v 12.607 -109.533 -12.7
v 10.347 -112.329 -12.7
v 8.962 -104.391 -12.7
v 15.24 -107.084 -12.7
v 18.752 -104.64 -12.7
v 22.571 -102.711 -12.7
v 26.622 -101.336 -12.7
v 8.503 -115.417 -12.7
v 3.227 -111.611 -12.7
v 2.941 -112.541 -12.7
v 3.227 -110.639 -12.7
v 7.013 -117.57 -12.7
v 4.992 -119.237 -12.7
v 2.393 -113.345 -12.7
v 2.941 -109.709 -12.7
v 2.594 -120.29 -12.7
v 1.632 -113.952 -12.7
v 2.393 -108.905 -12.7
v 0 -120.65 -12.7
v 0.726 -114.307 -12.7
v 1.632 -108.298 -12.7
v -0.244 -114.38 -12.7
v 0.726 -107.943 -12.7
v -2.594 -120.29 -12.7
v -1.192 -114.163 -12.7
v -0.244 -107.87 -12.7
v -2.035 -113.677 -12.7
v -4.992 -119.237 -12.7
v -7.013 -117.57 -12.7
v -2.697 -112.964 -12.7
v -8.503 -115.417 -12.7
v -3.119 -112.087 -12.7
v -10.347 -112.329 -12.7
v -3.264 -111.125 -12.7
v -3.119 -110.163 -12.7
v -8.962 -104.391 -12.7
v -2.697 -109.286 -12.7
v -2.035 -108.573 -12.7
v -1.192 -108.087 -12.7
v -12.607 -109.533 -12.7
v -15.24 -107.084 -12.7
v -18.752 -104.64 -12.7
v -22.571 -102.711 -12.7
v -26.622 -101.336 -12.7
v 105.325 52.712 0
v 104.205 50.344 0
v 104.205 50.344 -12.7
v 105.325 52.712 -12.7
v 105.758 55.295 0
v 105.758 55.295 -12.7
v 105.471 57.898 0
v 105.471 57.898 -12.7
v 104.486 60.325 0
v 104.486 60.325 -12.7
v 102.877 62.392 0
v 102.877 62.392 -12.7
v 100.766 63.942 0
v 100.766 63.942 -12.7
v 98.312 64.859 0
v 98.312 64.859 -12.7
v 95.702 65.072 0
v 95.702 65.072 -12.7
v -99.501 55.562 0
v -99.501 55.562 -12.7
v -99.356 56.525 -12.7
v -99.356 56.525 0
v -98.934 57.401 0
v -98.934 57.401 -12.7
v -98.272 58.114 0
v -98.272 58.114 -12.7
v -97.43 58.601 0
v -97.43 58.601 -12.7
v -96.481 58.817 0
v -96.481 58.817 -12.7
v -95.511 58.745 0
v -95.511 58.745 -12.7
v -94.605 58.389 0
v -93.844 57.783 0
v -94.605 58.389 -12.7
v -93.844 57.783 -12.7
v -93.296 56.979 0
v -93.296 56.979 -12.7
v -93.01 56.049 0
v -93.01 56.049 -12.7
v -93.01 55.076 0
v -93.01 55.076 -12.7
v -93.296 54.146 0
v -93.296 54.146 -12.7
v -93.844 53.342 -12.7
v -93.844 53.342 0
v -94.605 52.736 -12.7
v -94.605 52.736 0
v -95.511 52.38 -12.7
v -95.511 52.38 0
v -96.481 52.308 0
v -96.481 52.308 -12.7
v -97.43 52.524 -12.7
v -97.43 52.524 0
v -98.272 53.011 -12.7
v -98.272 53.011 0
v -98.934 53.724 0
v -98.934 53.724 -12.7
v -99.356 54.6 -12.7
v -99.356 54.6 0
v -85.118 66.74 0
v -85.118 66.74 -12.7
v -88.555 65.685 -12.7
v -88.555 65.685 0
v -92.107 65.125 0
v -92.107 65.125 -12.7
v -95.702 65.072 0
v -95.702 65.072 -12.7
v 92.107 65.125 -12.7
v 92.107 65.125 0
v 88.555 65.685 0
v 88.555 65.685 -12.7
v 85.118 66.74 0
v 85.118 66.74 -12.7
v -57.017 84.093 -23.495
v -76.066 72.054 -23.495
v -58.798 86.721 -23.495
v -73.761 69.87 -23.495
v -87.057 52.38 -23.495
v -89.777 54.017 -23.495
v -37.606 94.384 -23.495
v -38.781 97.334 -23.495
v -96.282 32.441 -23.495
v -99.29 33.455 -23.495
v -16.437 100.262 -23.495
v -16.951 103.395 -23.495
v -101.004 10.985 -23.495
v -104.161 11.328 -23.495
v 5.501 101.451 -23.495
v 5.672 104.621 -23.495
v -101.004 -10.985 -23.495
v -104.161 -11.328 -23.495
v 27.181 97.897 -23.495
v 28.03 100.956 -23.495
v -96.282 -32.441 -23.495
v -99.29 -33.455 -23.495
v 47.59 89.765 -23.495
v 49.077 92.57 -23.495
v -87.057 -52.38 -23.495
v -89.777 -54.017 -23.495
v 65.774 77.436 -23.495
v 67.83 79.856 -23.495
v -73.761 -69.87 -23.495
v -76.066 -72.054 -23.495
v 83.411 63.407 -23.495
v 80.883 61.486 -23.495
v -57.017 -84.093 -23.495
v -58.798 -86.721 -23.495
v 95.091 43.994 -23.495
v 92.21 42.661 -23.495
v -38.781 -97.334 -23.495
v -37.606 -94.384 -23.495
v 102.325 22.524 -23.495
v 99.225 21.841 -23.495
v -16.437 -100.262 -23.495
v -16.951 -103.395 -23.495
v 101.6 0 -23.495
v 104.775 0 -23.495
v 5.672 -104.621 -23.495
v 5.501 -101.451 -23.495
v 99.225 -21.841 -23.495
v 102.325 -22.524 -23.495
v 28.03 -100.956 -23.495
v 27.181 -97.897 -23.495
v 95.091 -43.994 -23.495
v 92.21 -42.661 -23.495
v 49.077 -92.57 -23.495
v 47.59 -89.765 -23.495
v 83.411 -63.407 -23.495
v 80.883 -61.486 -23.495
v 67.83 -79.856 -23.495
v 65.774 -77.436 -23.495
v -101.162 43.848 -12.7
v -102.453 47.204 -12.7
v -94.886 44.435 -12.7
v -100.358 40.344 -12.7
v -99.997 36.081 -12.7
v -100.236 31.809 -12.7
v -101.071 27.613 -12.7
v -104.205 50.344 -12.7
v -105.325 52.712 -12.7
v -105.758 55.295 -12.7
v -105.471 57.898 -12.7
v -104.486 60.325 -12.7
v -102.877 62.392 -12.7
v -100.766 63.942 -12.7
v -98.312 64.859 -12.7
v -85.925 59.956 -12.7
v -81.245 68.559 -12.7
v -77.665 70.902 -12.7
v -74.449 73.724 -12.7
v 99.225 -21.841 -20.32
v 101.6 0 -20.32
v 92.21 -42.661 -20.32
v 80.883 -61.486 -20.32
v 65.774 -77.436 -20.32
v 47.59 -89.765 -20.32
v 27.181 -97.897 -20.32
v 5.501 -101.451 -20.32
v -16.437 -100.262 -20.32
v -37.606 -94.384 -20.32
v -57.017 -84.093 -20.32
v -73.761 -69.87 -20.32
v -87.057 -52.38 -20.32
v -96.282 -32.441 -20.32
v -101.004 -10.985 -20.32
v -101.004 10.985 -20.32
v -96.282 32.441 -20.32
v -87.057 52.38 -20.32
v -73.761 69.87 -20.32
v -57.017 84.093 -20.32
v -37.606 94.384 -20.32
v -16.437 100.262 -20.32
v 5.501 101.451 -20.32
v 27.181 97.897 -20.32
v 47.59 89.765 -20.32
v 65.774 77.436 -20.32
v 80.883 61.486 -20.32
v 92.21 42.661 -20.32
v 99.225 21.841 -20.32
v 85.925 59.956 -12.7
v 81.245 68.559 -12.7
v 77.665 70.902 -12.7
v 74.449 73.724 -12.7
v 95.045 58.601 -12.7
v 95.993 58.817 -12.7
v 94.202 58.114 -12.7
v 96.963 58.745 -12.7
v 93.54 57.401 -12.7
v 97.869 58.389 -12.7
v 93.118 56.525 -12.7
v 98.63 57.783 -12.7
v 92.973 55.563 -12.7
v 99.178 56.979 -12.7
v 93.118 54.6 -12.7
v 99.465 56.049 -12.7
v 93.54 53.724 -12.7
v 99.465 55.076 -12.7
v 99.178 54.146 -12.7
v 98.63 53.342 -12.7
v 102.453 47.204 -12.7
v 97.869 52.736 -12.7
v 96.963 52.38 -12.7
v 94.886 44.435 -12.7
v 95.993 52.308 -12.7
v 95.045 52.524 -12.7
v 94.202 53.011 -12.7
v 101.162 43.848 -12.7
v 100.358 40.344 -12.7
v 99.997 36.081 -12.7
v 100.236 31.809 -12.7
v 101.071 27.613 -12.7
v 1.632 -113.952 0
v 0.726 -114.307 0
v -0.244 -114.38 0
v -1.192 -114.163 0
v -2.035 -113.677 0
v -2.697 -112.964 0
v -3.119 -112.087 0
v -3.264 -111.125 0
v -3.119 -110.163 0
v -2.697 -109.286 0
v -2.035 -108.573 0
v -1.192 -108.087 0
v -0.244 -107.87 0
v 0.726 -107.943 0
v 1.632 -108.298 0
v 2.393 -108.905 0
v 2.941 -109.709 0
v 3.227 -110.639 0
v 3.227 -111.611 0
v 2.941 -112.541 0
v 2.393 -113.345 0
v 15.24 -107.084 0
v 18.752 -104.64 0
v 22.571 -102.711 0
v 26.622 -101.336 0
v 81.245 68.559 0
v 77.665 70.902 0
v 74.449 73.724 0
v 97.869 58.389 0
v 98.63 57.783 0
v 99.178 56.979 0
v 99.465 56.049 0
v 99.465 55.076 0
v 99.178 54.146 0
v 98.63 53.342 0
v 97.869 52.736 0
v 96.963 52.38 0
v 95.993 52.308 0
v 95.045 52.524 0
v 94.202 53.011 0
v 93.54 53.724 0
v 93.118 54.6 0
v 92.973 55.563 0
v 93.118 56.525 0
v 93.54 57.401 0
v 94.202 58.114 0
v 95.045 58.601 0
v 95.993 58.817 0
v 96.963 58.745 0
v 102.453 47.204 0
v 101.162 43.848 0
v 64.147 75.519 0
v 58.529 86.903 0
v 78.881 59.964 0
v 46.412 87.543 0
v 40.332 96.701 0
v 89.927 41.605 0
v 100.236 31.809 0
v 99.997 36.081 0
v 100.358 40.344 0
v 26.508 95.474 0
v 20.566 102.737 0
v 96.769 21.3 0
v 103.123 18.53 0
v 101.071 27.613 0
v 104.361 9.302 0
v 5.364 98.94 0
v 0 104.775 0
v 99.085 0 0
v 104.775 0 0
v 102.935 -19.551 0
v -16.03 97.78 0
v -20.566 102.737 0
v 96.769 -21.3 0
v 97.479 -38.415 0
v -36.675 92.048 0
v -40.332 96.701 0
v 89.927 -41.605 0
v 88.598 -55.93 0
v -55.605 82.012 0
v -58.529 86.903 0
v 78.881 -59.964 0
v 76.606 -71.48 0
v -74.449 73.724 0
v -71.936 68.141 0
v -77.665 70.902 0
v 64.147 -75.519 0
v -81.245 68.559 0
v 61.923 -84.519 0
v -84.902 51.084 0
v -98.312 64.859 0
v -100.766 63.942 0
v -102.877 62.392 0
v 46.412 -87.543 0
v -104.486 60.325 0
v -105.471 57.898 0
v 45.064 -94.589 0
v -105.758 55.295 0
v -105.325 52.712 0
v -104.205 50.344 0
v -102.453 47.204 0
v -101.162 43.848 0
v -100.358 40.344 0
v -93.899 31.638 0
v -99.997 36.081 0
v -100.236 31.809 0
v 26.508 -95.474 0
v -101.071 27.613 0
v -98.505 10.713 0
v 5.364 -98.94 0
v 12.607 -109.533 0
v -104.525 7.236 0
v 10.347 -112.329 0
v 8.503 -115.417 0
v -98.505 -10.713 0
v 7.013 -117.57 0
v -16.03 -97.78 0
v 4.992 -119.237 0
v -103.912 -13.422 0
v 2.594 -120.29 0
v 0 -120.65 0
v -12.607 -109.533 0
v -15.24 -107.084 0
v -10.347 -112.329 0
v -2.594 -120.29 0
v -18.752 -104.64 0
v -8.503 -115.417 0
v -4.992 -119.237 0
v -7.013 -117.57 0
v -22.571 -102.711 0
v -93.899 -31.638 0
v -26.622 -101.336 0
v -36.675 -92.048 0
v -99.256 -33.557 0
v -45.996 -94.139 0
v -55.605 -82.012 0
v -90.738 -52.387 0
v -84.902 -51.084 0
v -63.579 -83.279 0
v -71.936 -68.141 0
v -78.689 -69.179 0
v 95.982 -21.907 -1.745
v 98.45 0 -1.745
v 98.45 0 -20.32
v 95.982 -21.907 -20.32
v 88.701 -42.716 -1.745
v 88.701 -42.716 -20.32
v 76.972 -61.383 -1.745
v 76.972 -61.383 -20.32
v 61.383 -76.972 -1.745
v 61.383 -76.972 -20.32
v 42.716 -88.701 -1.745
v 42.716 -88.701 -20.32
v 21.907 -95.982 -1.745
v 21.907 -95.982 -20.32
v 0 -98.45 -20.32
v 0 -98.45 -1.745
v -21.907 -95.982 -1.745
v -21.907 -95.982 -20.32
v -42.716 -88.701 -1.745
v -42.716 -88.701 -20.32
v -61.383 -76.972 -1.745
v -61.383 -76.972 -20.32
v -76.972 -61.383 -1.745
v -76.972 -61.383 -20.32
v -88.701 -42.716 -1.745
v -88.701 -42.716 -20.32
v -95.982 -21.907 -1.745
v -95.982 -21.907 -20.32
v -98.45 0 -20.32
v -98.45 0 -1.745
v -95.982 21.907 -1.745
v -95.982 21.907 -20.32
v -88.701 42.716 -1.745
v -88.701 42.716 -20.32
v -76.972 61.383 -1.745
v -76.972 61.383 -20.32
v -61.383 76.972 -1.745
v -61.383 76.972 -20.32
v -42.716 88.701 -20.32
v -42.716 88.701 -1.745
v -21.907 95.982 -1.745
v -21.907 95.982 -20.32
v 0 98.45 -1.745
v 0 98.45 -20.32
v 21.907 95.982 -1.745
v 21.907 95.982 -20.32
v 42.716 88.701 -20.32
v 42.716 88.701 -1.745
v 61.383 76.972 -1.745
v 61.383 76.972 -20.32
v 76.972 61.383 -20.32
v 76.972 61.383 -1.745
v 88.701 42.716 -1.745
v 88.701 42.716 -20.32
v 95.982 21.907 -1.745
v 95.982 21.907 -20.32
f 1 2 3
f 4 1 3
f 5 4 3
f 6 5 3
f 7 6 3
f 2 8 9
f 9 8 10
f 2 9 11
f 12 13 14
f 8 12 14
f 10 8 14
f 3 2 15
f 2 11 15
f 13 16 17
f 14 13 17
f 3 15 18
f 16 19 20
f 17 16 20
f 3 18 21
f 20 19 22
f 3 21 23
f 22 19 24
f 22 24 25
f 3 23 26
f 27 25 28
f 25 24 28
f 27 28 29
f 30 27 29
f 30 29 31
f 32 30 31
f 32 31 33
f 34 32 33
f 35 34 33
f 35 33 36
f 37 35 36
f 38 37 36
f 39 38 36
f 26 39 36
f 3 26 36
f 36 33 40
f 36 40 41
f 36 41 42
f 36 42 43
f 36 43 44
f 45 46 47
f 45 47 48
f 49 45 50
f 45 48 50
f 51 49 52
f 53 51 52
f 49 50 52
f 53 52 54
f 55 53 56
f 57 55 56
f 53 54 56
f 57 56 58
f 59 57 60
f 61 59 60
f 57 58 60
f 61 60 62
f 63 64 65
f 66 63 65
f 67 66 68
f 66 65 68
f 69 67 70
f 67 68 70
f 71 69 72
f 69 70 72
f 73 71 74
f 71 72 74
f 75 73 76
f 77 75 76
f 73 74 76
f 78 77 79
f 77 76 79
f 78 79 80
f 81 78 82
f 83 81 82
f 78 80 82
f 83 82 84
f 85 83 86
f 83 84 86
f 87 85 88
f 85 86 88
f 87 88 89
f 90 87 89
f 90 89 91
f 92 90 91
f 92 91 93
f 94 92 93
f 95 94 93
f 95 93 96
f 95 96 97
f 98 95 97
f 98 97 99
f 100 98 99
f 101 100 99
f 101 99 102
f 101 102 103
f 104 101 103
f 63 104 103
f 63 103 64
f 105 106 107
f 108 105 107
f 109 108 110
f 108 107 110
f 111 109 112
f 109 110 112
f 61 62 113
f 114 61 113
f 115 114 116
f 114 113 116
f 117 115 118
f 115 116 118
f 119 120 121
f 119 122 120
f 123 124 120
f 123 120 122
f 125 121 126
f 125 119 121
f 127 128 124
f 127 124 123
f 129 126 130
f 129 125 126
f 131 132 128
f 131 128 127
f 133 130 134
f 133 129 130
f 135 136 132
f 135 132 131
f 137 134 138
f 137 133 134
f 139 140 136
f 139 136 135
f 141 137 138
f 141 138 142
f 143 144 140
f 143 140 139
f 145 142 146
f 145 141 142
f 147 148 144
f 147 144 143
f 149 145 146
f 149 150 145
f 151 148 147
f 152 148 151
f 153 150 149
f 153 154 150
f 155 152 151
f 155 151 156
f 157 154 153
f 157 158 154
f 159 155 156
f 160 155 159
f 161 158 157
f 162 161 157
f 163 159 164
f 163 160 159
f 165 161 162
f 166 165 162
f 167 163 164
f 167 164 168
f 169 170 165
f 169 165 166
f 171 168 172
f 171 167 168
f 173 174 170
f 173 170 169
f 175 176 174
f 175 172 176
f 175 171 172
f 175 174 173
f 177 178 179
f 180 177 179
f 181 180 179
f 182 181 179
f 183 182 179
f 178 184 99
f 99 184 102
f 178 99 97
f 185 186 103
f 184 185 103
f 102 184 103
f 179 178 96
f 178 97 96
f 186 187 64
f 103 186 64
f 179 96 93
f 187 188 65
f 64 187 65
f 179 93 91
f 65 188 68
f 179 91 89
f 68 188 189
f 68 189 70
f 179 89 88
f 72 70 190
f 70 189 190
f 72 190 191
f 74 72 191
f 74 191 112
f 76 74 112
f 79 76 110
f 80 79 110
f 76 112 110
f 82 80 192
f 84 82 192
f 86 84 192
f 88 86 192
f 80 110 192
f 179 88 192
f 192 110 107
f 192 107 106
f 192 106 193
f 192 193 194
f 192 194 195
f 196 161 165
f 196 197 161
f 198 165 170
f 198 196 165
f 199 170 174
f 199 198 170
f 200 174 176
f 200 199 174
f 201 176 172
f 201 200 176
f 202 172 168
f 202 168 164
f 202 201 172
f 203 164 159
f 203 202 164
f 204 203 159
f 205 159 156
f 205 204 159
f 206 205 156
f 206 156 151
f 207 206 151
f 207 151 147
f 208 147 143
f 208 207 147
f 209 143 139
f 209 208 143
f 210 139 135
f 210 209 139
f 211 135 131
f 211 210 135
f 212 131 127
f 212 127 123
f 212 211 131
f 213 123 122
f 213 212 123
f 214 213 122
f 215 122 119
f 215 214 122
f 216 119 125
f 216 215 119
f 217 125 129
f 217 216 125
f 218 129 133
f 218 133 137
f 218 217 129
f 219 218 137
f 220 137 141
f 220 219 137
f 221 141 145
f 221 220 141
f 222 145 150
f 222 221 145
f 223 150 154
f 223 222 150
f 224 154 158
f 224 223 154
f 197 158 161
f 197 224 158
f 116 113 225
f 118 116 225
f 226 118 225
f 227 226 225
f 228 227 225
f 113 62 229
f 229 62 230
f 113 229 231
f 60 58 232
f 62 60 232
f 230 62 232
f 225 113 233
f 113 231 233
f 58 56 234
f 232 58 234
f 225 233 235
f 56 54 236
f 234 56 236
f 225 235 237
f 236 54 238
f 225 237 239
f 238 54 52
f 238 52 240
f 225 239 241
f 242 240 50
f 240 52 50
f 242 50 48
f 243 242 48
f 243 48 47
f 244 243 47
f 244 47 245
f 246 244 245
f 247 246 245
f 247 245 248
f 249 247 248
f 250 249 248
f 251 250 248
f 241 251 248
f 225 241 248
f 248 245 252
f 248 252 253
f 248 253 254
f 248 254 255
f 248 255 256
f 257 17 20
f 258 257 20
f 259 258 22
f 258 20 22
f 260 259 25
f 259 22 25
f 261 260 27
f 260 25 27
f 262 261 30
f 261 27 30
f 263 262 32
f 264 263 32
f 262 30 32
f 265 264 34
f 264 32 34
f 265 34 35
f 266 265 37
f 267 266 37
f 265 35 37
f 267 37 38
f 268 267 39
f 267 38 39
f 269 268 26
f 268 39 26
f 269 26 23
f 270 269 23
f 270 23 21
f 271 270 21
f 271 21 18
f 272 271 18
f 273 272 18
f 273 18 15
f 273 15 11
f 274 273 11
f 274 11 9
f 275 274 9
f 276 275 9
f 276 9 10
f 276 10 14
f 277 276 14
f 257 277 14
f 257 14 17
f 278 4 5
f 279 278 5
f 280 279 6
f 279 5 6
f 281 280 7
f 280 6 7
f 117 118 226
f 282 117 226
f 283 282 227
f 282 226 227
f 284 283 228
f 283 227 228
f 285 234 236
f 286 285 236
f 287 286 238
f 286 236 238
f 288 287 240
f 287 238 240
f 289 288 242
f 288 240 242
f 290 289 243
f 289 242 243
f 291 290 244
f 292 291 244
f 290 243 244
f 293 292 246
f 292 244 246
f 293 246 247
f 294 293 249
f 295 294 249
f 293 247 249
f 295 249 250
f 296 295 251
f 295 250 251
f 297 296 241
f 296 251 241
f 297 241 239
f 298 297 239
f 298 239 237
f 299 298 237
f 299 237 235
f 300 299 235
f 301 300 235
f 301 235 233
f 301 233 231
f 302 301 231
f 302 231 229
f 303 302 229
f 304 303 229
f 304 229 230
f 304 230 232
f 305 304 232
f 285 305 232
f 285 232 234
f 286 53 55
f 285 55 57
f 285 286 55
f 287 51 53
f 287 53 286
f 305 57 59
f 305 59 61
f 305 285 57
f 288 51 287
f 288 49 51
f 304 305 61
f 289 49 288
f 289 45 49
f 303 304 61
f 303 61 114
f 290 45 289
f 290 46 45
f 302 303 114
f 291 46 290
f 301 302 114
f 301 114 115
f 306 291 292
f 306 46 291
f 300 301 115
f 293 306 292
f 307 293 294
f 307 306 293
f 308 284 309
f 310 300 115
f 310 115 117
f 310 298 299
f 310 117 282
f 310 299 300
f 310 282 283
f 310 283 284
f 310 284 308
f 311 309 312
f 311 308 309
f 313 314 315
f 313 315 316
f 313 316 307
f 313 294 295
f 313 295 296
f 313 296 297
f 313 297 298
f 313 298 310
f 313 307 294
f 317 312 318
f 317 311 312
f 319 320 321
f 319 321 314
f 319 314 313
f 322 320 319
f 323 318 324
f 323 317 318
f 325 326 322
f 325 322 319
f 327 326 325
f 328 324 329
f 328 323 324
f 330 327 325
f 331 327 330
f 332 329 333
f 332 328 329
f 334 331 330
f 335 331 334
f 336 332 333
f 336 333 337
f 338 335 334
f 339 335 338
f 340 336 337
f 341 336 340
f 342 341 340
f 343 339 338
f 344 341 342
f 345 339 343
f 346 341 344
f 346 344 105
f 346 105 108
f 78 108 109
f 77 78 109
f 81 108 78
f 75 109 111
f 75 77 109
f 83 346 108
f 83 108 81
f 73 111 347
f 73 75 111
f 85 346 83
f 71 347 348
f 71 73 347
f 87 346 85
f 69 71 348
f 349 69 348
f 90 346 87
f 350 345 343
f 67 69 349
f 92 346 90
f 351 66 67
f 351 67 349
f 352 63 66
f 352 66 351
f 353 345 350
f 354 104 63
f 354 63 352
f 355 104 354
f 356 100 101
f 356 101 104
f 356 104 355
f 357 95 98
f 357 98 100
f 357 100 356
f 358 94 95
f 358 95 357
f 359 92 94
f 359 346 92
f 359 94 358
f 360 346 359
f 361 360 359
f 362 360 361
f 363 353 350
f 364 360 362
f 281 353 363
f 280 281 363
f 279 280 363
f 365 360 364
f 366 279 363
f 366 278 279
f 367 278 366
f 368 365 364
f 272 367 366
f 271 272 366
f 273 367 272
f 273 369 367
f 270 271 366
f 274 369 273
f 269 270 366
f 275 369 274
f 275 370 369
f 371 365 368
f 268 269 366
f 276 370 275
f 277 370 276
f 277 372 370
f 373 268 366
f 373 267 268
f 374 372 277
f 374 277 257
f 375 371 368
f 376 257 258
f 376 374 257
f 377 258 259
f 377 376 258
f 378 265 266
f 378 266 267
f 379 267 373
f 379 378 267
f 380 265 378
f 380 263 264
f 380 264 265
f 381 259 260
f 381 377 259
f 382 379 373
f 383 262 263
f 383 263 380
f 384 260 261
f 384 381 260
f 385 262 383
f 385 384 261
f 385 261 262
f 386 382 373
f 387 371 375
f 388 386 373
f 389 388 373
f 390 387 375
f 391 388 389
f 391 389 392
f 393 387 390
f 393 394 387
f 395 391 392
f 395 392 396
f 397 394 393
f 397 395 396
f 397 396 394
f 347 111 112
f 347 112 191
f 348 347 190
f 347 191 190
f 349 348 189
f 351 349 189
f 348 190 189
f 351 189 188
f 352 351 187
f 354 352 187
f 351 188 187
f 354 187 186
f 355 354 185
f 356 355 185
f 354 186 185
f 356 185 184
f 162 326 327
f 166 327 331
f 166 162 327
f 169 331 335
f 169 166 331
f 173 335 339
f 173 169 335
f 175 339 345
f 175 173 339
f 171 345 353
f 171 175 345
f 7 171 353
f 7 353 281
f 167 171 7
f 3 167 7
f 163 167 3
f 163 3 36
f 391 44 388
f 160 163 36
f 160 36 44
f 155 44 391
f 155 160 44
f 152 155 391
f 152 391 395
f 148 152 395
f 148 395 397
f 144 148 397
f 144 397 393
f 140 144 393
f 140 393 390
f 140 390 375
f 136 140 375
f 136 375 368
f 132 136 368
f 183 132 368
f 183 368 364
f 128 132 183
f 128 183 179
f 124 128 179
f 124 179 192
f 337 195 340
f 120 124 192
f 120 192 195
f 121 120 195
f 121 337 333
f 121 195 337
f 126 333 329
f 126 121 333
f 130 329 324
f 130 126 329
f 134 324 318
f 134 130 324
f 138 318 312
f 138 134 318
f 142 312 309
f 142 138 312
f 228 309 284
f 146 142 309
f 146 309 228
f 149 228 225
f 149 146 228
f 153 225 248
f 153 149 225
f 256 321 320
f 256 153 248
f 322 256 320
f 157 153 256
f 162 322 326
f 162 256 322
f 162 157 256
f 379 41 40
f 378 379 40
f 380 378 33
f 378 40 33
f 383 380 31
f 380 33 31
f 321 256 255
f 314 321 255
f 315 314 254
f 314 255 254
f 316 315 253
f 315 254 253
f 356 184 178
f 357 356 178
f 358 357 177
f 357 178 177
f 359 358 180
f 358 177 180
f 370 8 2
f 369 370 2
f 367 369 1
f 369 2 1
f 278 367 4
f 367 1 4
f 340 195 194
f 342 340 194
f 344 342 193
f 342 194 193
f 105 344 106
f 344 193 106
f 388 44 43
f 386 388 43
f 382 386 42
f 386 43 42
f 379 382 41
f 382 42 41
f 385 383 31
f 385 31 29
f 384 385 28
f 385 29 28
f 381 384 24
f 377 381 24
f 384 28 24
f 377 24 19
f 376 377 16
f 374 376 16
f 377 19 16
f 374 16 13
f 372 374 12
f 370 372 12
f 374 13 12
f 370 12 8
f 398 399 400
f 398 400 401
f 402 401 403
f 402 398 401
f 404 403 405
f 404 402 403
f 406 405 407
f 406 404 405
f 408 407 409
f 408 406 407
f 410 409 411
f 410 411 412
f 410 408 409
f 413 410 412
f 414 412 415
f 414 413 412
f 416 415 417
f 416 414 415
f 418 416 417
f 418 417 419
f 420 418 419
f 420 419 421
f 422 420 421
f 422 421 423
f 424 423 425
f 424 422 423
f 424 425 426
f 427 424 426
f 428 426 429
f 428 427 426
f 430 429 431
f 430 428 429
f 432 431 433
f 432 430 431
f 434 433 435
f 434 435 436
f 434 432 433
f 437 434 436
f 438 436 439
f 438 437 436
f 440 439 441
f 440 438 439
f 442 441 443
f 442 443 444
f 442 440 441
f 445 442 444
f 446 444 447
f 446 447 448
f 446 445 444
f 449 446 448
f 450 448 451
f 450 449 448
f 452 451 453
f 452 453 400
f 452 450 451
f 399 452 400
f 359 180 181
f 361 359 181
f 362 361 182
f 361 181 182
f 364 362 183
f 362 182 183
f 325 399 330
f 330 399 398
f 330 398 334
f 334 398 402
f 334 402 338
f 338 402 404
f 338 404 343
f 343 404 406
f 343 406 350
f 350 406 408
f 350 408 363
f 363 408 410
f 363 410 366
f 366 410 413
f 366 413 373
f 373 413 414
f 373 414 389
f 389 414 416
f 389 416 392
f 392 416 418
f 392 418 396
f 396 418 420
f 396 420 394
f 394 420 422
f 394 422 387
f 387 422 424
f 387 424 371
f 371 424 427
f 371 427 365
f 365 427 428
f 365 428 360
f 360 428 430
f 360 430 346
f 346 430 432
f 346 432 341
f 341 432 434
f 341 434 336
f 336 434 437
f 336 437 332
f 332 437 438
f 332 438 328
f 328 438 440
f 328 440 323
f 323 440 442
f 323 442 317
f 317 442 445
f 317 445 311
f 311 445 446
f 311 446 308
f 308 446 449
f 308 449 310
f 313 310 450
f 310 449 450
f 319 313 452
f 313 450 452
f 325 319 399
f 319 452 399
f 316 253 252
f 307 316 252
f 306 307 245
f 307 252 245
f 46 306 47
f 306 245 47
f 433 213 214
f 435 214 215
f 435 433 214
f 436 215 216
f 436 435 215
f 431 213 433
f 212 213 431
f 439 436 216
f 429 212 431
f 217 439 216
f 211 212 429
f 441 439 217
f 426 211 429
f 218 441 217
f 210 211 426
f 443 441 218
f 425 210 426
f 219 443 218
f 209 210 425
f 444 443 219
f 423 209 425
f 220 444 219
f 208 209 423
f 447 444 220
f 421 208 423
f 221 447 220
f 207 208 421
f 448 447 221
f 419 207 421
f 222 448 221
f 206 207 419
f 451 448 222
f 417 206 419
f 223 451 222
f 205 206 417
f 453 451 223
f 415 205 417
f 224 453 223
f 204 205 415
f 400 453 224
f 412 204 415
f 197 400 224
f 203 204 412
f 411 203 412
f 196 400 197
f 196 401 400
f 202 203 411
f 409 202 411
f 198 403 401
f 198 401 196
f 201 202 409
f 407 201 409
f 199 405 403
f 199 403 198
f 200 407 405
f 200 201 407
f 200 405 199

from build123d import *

# Parameters (mm, degrees)
BOSS_EXTRUDE2_START     = -12.7
BOSS_EXTRUDE2_DEPTH     = 12.7
F_1_4_CLEARANCE_HOLE1_D = 6.5278
CIRPATTERN3_COUNT       = 3
CHAMFER1_SIZE           = 0.635
CHAMFER1_SIZE2          = 1.744648161


with BuildPart() as part:
    # Sketch3 → Revolve1 (revolve)
    with BuildSketch(Plane(origin=(0, 0, 0), x_dir=(0, 0, -1), z_dir=(1, 0, 0)), mode=Mode.PRIVATE) as revolve1_sk:
        Polygon((0, 104.775), (23.495, 104.775), (23.495, 101.6), (20.32, 101.6), (20.32, 98.4504), (0, 98.4504), align=None)
    revolve(revolve1_sk.sketch.rotate(Axis((0, 0, 0), (0, 0, -1)), 90), axis=Axis((0, 0, 0), (0, 0, -1)))

    # Sketch8 → Boss-Extrude2 (add)
    with BuildSketch(Plane.XY.offset(BOSS_EXTRUDE2_START)):
        with BuildLine():
            ThreePointArc((-95.701964649, 65.072457101), (-104.485964967, 60.325), (-104.205383261, 50.344104028))
            ThreePointArc((-104.205383261, 50.344104028), (-101.748303649, 45.549235235), (-100.357835782, 40.343987299))
            ThreePointArc((-100.357835782, 40.343987299), (-100.041194467, 33.940544408), (-101.071009975, 27.612525556))
            ThreePointArc((-101.071009975, 27.612525556), (-90.737811682, 52.3875), (-74.448653582, 73.723799447))
            ThreePointArc((-74.448653582, 73.723799447), (-79.41397091, 69.667943629), (-85.117835782, 66.740441606))
            ThreePointArc((-85.117835782, 66.740441606), (-90.320946661, 65.341998135), (-95.701964649, 65.072457101))
        make_face()
    boss_extrude2 = extrude(amount=BOSS_EXTRUDE2_DEPTH)

    # 1/4 Clearance Hole1 (through all)
    with Locations(Plane(origin=(-78.9129789, -32.747864356, 0), x_dir=(1, 0, 0), z_dir=(0, 0, 1))):
        with Locations((-17.324094096, 88.310364356)):
            f_1_4_clearance_hole1 = Hole(F_1_4_CLEARANCE_HOLE1_D / 2)

    # CirPattern3: Boss-Extrude2, 1/4 Clearance Hole1 ×3 about axis
    cirpattern3_axis = Axis((0, 0, 0), (0, 0, 1))
    add([boss_extrude2.rotate(cirpattern3_axis, i * 360 / CIRPATTERN3_COUNT) for i in range(1, CIRPATTERN3_COUNT)])
    add([f_1_4_clearance_hole1.rotate(cirpattern3_axis, i * 360 / CIRPATTERN3_COUNT) for i in range(1, CIRPATTERN3_COUNT)], mode=Mode.SUBTRACT)

    # Chamfer1
    chamfer1_edges = [part.edges().sort_by_distance(p)[0] for p in [
        (-98.4504, 0, 0),
    ]]
    chamfer1_side = [part.faces().sort_by_distance(p)[0] for p in [
        (80.519485647, -62.098271917, 0),
    ]]
    chamfer(chamfer1_edges, length=CHAMFER1_SIZE, length2=CHAMFER1_SIZE2, reference=chamfer1_side[0])


solid = part.part
